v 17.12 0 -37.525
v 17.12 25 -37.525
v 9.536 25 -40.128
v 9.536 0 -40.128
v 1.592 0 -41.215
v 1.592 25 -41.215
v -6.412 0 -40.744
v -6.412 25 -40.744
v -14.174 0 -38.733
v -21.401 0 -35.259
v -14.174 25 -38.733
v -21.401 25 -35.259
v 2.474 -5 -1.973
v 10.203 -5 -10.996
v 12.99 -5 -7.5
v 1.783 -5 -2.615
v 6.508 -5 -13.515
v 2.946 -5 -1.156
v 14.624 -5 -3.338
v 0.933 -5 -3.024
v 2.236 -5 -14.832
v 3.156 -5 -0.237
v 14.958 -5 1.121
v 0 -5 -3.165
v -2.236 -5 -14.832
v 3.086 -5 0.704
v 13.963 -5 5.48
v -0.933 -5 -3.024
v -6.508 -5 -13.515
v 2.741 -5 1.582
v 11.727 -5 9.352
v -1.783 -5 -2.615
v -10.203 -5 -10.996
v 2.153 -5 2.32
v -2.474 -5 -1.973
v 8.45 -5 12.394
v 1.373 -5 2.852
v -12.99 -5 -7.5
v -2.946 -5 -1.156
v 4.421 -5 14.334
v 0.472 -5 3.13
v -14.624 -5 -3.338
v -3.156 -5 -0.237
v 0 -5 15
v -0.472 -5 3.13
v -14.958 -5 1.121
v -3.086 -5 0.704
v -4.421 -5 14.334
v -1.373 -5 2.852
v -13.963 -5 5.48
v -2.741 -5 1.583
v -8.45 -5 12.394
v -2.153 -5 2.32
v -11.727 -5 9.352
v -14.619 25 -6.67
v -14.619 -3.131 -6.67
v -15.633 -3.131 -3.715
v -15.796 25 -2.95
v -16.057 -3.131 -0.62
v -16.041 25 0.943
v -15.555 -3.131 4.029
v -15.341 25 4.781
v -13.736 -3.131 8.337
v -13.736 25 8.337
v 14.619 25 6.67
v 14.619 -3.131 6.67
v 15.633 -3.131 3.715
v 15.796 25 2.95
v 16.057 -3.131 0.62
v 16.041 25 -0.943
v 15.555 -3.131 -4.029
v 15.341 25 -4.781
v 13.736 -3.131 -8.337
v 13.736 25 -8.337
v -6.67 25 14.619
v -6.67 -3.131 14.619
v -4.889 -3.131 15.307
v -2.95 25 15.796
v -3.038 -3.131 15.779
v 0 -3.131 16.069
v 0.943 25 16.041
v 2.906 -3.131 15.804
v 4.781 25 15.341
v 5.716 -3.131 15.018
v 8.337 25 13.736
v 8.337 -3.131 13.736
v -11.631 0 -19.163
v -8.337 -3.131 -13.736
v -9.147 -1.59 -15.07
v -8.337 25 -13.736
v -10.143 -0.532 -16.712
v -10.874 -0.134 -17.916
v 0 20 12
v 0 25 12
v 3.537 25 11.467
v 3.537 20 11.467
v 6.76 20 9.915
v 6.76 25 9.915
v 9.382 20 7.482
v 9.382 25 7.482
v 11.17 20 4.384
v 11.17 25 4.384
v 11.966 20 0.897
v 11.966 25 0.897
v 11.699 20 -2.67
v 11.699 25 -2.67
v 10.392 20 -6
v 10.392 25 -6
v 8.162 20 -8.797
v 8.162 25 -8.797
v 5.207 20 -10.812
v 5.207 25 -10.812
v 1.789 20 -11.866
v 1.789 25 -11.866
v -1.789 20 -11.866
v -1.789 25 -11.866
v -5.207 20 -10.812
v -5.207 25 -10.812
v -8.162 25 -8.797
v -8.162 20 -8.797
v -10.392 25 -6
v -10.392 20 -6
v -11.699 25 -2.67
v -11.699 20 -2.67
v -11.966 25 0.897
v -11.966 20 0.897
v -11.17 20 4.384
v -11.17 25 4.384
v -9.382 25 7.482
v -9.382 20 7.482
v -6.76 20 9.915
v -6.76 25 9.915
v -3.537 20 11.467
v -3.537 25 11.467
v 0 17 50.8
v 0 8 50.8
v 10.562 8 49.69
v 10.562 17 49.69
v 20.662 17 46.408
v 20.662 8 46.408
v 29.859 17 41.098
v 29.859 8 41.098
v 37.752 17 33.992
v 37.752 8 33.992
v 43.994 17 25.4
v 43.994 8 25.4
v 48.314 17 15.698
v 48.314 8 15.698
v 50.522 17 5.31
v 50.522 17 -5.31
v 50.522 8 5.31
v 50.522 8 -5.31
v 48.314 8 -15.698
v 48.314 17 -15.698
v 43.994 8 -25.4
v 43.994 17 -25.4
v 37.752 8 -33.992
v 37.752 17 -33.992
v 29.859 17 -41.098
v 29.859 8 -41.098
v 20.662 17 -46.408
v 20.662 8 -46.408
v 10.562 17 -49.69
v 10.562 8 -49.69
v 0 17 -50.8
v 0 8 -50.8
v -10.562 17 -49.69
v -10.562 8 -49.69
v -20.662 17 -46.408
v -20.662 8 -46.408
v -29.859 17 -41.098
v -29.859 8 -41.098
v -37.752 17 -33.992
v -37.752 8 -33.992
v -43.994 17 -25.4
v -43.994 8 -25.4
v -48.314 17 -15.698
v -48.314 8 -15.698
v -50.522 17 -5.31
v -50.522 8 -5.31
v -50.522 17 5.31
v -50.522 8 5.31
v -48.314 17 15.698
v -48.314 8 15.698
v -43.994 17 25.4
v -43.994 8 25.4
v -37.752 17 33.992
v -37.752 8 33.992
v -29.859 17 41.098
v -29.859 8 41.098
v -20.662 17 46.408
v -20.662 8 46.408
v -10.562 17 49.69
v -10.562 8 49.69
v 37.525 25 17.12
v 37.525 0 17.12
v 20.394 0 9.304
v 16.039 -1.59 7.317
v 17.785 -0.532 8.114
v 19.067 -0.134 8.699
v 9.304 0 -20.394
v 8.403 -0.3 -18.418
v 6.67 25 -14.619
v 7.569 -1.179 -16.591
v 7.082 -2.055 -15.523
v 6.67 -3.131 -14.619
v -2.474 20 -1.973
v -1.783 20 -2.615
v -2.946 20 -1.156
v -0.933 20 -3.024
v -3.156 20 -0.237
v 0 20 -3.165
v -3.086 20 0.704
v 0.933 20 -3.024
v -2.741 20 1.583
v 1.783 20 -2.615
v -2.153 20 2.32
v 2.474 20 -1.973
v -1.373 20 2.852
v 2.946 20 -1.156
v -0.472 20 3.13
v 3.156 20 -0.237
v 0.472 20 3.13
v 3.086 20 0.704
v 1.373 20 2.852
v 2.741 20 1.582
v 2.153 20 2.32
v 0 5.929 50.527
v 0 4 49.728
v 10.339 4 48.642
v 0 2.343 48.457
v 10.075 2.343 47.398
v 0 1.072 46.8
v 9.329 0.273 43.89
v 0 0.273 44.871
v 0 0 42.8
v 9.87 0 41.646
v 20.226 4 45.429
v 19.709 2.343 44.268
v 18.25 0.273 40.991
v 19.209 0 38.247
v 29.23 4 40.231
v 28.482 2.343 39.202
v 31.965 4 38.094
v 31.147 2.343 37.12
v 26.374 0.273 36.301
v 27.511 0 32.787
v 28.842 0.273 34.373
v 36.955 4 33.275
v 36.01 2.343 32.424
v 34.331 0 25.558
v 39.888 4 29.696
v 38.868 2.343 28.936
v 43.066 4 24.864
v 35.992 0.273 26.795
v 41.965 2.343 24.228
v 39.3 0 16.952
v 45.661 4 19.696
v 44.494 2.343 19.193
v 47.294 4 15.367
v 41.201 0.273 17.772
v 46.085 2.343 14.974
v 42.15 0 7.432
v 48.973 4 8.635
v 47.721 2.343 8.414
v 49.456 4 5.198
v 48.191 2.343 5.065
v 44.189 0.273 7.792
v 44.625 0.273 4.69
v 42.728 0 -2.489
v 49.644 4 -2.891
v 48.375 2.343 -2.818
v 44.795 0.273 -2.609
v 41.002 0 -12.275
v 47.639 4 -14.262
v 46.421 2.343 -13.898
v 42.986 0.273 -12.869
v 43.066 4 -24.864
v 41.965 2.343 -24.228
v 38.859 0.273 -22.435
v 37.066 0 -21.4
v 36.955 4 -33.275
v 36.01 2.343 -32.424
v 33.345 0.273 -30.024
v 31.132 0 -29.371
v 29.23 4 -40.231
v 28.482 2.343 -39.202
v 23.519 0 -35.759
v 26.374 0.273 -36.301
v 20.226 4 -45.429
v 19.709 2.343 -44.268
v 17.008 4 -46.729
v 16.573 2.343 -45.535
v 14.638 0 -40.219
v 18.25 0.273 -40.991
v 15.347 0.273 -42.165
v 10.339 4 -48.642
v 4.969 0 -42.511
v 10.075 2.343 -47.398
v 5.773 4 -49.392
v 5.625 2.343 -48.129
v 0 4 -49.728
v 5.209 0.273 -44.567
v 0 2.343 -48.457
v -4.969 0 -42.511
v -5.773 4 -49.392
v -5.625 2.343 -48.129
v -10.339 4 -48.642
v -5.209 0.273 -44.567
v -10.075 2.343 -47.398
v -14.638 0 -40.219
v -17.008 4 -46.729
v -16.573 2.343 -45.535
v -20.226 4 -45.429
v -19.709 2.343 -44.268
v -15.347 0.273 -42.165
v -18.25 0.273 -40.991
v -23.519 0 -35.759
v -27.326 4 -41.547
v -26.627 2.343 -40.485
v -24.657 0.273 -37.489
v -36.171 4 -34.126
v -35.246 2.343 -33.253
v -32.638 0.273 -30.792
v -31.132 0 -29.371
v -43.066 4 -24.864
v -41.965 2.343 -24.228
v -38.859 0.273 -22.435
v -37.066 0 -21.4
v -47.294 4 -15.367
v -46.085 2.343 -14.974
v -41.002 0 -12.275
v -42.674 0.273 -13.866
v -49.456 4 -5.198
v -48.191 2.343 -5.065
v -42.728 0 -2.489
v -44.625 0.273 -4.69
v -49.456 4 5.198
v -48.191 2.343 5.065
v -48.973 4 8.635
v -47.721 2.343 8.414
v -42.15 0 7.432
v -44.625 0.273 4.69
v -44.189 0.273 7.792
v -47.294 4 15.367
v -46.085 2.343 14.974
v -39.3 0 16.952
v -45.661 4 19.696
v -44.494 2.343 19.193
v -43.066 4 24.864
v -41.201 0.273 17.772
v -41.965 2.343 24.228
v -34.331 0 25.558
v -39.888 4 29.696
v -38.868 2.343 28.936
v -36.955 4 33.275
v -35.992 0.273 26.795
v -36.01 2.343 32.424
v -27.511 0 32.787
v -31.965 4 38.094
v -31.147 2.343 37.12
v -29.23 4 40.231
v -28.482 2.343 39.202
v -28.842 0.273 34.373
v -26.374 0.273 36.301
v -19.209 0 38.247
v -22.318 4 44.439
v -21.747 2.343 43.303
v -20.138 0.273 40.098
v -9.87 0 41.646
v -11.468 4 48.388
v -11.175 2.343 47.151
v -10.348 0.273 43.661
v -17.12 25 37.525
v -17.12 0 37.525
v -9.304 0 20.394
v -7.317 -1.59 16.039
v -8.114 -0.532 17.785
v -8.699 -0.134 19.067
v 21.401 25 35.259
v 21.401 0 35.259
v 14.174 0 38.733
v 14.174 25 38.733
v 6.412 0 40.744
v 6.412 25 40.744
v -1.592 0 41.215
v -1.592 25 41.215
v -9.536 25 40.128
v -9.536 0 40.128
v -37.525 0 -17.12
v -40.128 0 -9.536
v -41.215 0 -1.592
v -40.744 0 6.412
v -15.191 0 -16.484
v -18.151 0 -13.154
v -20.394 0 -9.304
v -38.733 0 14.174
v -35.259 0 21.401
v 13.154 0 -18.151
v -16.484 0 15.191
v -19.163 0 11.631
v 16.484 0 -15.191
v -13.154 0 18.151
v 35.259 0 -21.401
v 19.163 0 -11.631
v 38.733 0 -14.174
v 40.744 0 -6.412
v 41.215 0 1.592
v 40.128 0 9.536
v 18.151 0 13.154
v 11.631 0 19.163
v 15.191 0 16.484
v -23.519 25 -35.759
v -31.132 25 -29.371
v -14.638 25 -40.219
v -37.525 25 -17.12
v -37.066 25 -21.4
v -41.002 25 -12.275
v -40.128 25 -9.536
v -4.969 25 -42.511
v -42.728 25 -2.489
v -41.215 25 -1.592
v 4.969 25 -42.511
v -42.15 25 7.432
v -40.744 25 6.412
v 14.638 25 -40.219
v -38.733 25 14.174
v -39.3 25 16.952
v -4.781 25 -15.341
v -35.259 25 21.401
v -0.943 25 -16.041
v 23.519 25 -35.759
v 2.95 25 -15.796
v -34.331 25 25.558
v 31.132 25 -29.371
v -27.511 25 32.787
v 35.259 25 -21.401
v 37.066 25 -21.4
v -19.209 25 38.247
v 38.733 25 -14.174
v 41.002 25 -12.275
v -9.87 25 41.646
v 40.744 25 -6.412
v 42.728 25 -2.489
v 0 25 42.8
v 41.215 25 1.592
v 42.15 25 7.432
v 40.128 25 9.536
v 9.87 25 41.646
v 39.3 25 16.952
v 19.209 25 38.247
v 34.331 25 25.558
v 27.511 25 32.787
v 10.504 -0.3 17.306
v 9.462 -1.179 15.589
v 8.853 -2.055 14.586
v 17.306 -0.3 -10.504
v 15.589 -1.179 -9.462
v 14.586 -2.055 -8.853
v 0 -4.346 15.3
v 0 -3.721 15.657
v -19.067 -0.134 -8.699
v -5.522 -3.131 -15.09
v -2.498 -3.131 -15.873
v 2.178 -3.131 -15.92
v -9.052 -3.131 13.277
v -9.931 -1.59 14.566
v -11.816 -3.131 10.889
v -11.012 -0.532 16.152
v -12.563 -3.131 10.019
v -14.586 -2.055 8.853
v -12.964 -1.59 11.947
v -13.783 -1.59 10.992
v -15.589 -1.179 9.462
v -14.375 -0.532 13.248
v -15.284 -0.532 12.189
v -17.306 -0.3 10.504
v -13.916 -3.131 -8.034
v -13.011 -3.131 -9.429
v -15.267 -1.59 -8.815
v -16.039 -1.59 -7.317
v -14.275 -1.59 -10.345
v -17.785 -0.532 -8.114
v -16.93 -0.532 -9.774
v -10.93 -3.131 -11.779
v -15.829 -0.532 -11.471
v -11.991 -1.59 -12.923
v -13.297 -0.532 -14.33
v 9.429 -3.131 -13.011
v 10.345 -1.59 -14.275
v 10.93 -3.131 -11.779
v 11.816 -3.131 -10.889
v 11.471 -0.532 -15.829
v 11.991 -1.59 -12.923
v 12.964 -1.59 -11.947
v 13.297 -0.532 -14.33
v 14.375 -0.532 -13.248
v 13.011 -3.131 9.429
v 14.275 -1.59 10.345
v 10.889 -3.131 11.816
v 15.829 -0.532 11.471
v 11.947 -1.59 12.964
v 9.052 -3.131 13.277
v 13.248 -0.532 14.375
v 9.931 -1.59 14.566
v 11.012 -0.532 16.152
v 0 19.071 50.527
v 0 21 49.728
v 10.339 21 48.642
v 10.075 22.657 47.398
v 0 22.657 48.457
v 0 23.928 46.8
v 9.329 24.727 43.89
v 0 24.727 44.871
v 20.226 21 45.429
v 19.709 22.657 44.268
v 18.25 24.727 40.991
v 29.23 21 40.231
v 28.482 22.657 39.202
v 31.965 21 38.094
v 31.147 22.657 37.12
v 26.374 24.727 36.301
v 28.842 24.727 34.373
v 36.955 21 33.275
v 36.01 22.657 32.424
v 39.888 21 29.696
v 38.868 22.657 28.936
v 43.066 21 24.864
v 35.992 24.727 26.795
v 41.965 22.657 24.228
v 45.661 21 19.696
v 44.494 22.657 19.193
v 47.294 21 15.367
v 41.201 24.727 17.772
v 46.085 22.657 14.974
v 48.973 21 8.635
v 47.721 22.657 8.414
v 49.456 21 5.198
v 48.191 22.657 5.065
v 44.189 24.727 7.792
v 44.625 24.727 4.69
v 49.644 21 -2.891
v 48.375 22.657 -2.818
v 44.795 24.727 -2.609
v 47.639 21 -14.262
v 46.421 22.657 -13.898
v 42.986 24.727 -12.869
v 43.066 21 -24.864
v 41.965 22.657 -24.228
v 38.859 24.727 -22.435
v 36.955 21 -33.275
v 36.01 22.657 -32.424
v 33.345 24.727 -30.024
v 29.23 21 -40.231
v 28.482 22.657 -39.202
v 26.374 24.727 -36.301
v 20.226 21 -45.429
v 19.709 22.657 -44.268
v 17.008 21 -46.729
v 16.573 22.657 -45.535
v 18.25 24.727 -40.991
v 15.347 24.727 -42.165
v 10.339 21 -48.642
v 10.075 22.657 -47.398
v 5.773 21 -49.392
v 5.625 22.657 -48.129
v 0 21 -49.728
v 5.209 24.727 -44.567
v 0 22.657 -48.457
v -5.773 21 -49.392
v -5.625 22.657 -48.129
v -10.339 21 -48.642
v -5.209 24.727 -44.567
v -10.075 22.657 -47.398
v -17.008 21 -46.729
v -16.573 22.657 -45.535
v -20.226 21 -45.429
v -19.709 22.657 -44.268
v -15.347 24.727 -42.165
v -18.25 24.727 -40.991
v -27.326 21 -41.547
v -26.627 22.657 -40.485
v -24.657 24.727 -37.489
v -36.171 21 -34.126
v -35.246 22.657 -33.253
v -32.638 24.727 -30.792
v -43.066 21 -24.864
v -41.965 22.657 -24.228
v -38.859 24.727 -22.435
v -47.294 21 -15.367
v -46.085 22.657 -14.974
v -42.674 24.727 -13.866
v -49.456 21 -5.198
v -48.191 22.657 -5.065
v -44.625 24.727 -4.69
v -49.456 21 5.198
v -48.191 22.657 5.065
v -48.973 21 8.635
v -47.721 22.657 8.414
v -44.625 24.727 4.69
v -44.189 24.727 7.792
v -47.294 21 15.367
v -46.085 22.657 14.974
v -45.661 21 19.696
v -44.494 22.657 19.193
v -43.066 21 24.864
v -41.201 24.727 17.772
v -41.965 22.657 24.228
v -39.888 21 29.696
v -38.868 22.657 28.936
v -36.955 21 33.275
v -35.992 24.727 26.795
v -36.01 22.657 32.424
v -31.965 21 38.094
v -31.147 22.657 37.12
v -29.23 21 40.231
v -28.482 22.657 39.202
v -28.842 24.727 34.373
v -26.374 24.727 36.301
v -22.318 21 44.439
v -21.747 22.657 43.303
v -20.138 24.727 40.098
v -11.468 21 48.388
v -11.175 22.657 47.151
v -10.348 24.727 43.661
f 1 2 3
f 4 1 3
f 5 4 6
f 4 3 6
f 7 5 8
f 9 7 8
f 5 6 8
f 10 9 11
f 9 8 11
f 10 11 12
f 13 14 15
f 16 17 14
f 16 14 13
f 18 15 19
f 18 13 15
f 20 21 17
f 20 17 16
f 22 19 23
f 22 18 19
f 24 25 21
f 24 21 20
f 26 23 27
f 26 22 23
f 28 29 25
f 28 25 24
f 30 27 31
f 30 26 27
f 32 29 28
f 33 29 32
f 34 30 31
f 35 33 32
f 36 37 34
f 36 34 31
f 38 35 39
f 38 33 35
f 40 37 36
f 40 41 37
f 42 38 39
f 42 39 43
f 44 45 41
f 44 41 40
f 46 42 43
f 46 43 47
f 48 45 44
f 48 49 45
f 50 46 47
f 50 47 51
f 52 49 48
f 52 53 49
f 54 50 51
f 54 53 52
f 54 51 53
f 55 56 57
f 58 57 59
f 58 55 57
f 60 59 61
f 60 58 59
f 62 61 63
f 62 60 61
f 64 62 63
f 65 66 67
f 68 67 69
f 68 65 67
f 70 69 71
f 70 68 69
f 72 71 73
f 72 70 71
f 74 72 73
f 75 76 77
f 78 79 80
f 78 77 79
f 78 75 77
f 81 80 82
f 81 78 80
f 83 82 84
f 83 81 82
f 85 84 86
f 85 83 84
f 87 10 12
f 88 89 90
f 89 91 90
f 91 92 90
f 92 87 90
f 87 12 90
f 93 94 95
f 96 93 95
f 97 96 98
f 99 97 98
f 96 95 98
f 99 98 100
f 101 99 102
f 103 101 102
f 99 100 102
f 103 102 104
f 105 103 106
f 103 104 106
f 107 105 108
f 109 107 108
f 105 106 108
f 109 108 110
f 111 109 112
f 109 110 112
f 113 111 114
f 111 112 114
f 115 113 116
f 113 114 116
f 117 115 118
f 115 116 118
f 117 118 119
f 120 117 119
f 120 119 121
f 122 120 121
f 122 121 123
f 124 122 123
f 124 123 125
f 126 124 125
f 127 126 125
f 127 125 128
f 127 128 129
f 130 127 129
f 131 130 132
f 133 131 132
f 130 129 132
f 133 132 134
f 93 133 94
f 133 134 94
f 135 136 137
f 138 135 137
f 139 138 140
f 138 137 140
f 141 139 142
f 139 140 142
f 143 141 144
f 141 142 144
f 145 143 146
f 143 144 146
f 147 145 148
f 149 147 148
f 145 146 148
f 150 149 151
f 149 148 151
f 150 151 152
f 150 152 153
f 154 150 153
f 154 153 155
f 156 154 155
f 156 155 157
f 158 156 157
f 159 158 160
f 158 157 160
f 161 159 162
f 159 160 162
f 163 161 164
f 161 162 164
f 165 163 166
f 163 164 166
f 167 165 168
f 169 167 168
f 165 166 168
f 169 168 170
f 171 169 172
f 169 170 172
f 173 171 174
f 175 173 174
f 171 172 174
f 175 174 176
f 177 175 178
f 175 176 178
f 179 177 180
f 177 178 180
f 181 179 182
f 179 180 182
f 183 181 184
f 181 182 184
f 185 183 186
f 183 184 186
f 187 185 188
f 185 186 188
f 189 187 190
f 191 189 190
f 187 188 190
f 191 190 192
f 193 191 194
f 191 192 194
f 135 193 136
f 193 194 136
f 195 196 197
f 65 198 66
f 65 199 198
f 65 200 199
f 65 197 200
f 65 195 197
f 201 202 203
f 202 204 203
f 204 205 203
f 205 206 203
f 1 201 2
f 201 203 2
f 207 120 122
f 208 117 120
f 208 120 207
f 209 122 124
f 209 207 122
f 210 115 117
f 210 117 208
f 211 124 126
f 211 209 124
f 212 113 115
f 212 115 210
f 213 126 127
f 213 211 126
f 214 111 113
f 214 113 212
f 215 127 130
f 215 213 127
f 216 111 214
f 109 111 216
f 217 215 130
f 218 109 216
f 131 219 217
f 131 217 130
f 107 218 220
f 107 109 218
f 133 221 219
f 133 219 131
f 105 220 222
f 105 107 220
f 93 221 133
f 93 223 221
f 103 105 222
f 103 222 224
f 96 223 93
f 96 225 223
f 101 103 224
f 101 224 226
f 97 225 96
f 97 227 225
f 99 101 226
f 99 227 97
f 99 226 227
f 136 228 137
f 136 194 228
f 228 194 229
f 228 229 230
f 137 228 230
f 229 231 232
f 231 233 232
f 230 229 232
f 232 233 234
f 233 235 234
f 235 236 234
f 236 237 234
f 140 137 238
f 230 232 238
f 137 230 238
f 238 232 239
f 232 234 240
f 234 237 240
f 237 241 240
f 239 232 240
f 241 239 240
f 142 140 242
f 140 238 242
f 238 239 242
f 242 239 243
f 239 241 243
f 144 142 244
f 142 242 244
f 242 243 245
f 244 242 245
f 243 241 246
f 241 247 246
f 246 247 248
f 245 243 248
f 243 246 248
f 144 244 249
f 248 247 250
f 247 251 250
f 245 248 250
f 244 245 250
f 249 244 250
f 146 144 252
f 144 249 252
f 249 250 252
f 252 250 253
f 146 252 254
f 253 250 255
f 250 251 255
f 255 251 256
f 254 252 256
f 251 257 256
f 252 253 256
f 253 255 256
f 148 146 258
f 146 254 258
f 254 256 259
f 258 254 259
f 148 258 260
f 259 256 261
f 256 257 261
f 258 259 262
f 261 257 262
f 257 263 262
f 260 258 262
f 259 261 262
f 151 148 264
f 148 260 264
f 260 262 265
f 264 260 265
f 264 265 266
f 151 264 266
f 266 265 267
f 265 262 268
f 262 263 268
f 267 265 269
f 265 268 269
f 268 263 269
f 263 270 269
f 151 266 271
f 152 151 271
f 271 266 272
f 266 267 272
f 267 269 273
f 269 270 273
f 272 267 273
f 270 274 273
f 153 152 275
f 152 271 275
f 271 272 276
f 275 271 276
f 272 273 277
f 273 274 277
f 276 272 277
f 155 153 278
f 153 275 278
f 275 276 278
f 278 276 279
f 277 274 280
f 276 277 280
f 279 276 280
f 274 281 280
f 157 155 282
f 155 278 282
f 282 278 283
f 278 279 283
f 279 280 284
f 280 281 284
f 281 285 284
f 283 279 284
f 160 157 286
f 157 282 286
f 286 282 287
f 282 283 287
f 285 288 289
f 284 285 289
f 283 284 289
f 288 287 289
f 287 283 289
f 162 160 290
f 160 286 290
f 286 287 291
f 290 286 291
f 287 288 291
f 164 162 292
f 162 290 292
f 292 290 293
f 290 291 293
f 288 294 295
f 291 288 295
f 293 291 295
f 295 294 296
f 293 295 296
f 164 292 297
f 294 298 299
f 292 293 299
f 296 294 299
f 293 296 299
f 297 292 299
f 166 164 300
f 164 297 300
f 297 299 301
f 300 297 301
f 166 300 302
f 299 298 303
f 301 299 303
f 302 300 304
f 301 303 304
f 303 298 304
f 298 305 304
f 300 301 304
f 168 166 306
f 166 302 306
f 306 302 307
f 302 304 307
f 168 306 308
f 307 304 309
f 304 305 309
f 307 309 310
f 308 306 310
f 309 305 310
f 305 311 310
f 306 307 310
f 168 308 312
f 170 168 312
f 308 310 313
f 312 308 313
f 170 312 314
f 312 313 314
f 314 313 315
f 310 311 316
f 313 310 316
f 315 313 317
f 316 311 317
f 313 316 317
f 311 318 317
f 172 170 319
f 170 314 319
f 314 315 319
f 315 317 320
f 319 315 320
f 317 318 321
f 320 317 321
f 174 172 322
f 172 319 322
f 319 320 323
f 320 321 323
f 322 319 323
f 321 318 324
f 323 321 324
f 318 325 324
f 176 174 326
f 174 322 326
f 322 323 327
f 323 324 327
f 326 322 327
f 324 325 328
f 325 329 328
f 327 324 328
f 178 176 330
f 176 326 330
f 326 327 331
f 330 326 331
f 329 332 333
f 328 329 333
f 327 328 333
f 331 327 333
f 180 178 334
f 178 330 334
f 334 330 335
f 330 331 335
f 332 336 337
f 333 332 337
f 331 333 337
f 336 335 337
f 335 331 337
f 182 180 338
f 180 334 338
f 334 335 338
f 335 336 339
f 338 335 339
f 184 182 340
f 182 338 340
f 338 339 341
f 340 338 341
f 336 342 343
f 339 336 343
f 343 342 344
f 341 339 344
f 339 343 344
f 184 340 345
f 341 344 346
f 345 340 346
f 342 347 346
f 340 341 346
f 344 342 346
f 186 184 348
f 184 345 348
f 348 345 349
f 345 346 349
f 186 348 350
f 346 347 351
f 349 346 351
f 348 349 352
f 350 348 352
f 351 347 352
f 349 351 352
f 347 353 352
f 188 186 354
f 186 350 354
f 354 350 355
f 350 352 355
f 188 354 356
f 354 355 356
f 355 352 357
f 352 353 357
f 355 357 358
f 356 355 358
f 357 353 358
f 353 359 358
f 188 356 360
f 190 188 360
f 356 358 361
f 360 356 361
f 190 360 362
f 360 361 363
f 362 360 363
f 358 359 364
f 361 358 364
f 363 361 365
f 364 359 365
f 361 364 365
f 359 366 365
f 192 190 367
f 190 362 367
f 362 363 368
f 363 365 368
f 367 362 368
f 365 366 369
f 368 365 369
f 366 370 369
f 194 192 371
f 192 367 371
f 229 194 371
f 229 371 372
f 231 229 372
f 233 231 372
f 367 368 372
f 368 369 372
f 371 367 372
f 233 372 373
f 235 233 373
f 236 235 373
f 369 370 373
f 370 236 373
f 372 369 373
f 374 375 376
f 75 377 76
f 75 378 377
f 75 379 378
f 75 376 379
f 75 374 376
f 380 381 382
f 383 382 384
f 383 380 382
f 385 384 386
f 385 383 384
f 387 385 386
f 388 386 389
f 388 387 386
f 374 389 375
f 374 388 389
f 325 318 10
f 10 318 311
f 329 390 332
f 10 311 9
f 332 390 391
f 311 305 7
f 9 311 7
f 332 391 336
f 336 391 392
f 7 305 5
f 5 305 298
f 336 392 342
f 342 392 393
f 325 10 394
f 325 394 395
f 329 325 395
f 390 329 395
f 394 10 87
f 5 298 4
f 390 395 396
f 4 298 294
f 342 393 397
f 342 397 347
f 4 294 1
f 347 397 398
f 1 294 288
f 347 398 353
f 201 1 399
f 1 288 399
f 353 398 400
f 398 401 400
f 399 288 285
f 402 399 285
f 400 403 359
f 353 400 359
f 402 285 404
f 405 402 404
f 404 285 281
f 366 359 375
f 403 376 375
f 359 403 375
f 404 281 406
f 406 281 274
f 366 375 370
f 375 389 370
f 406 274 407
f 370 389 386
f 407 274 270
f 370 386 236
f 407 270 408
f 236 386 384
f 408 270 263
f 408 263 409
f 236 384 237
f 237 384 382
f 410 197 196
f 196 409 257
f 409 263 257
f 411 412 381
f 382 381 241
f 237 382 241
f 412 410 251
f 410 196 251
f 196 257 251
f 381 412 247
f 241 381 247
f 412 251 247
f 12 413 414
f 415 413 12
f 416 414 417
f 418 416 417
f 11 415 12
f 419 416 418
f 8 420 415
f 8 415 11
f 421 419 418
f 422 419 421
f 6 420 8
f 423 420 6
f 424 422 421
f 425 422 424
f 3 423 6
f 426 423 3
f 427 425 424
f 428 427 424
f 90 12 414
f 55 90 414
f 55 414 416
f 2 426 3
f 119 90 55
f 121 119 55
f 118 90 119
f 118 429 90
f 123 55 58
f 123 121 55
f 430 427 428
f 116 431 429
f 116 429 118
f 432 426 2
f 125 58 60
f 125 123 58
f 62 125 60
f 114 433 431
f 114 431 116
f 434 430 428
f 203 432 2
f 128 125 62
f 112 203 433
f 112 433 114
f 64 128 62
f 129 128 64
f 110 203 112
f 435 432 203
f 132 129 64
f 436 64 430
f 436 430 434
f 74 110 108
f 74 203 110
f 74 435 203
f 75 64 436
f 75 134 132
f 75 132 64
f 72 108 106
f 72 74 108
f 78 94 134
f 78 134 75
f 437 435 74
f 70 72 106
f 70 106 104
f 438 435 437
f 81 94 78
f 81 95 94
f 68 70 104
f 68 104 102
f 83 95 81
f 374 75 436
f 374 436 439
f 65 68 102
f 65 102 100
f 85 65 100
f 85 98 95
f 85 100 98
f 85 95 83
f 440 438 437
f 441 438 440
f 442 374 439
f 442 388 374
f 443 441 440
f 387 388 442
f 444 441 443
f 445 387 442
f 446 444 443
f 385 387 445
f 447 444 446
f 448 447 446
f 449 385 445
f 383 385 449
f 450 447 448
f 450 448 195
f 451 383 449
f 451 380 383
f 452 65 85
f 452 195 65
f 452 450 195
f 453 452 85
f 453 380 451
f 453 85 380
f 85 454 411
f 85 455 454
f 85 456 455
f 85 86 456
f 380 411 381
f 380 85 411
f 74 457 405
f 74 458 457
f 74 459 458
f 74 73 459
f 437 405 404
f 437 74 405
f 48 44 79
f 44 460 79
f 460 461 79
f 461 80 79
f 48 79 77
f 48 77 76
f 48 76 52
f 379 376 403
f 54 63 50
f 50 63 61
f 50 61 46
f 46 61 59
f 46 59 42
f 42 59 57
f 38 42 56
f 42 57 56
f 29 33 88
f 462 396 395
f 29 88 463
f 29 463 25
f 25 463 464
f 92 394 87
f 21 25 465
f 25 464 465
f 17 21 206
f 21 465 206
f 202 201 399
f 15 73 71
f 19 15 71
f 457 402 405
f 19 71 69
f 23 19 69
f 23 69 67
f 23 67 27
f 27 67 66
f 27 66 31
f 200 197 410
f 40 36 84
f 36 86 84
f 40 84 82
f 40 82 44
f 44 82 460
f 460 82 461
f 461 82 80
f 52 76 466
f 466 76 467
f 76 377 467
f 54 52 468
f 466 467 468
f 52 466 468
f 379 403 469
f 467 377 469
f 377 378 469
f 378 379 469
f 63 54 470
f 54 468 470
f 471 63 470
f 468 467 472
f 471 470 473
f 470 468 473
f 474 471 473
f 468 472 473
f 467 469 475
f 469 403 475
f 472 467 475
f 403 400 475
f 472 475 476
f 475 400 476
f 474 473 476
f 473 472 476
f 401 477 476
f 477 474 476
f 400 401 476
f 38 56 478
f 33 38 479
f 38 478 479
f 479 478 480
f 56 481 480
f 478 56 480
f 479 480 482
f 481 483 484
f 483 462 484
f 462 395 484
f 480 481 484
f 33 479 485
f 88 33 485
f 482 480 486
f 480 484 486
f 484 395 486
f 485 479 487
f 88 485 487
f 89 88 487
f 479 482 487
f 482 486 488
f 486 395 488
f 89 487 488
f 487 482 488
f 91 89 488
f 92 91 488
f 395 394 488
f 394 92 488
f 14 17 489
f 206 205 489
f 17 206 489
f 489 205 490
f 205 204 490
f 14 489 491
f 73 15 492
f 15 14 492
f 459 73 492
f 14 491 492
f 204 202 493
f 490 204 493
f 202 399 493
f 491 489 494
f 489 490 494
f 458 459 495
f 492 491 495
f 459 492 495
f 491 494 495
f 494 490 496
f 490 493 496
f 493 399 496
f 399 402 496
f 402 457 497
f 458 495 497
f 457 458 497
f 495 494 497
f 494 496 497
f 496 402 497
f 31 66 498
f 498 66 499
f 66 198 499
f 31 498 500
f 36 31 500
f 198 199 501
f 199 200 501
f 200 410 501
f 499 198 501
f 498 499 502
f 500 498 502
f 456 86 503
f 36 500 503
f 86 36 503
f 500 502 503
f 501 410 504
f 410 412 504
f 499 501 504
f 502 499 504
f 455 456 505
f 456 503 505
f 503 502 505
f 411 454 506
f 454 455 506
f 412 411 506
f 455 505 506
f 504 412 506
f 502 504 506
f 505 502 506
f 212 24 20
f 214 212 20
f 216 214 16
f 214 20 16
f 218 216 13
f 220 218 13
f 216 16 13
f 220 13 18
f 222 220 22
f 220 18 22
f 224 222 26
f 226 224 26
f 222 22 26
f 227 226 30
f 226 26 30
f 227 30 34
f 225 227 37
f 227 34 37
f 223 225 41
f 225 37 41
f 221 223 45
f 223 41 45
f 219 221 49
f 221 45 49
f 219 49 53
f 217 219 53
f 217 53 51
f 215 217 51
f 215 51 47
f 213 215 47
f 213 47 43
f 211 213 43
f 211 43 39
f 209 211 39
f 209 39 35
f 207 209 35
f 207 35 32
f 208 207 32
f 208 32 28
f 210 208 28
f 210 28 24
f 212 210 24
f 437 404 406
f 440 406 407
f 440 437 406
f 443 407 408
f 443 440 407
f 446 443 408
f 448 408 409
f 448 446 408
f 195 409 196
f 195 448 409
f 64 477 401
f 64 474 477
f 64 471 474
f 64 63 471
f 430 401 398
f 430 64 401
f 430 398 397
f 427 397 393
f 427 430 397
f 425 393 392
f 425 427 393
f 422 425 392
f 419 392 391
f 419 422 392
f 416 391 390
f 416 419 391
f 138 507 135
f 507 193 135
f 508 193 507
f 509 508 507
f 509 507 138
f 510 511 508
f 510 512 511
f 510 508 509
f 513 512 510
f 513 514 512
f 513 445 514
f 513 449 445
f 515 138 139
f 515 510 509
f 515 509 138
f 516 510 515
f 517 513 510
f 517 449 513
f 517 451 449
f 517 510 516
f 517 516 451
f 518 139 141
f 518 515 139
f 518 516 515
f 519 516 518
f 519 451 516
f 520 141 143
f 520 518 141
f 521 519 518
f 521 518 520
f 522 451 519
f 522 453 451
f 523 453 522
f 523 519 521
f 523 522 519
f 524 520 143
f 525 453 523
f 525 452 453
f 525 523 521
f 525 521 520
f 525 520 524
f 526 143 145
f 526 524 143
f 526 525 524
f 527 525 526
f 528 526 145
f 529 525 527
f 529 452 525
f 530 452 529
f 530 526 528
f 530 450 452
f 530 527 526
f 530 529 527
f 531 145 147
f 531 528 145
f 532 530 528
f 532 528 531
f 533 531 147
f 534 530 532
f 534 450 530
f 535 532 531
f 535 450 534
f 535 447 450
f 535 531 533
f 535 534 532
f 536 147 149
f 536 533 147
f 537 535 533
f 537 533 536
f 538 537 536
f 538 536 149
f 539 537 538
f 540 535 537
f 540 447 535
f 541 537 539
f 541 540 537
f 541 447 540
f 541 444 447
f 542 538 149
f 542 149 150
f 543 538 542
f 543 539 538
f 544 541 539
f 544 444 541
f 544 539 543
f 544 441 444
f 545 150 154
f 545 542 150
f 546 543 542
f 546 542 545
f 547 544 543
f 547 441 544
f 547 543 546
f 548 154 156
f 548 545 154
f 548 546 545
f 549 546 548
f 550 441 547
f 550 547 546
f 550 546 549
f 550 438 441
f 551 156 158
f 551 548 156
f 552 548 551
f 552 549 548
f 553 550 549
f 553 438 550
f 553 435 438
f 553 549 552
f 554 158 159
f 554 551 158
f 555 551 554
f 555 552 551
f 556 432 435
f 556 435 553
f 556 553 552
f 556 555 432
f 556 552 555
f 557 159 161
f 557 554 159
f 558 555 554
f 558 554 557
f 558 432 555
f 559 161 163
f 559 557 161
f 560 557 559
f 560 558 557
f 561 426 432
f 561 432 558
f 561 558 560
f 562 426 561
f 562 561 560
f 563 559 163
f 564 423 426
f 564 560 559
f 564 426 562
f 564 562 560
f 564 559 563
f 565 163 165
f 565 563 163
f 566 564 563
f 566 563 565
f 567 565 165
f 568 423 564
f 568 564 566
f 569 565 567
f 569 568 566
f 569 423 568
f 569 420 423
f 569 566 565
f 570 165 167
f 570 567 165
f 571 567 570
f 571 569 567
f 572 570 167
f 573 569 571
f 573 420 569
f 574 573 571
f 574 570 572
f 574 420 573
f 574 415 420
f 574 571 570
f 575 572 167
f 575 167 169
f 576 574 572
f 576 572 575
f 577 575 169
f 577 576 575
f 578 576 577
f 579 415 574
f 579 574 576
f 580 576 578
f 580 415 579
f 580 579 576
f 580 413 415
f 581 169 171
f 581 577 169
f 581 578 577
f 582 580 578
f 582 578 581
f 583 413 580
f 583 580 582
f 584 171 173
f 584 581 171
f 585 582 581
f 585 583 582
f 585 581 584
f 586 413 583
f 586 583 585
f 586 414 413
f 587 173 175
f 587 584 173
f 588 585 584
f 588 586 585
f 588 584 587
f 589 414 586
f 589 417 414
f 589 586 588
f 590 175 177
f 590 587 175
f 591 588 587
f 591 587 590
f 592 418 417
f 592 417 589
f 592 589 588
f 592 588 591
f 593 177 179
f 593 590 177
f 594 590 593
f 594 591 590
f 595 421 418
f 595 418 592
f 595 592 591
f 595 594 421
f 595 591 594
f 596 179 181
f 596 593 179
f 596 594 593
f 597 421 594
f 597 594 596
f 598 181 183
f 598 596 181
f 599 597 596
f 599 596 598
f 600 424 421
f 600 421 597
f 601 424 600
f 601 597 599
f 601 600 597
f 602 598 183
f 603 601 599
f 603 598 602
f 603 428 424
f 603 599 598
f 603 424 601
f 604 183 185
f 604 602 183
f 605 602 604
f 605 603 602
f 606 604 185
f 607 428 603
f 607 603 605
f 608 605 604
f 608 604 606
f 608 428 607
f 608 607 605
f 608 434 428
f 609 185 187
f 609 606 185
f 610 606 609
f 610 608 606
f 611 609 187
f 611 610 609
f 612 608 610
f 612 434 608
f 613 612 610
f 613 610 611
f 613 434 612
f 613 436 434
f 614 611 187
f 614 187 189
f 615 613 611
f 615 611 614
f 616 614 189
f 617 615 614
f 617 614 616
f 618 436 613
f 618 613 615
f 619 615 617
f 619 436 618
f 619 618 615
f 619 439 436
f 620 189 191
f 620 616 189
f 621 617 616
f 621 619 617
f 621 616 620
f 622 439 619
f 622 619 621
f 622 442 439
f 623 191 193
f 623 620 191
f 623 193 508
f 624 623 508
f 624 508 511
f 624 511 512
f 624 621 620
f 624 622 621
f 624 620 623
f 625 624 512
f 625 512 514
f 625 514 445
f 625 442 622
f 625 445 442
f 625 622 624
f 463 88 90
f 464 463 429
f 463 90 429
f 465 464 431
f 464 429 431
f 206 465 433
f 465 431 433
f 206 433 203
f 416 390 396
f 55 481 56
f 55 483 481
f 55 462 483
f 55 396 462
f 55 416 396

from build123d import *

# Parameters (mm, degrees)
SKETCH1_R           = 50.8
BOSS_EXTRUDE1_DEPTH = 25
FILLET2_R           = 8
FILLET3_R           = 8
SKETCH2_R           = 15
BOSS_EXTRUDE2_DEPTH = 5
SKETCH3_R           = 12
CUT_EXTRUDE1_DEPTH  = 5
FILLET4_R           = 8
SKETCH5_R           = 3.165
CUT_EXTRUDE2_DEPTH  = 78.85422275
CUT_EXTRUDE3_DEPTH  = 78.85422275


with BuildPart() as part:
    # Sketch1 → Boss-Extrude1 (new body)
    with BuildSketch(Plane(origin=(0, 0, 0), x_dir=(1, 0, 0), z_dir=(0, 1, 0))):
        with Locations(Location((0, 0, 0), (0, 0, 270))):
            Circle(SKETCH1_R)
    extrude(amount=BOSS_EXTRUDE1_DEPTH)

    # Fillet2
    fillet2_edges = [part.edges().sort_by_distance(p)[0] for p in [
        (0, 25, -50.8),
    ]]
    fillet(fillet2_edges, radius=FILLET2_R)

    # Fillet3
    fillet3_edges = [part.edges().sort_by_distance(p)[0] for p in [
        (0, 0, -50.8),
    ]]
    fillet(fillet3_edges, radius=FILLET3_R)

    # Sketch2 → Boss-Extrude2 (add)
    with BuildSketch(Plane.XZ):
        with Locations(Location((0, 0, 0), (0, 0, 90))):
            Circle(SKETCH2_R)
    extrude(amount=BOSS_EXTRUDE2_DEPTH)

    # Sketch3 → Cut-Extrude1 (cut)
    with BuildSketch(Plane(origin=(0, 25, 0), x_dir=(1, 0, 0), z_dir=(0, 1, 0))):
        with Locations(Location((0, 0, 0), (0, 0, 270))):
            Circle(SKETCH3_R)
    extrude(amount=-CUT_EXTRUDE1_DEPTH, mode=Mode.SUBTRACT)

    # Fillet4
    # the kernel refuses this fillet: 8 mm, written as the material it adds along each edge
    with BuildSketch(Plane(origin=(0, 0, 0), x_dir=(0, 0, 1), z_dir=(1, 0, 0))) as fillet4_piece_1:
        with BuildLine():
            CenterArc((22.416198487, 8), FILLET4_R, 202.024312837, 67.975687163)
            Line((15, 5), (14.85167603, 4.94))
            ThreePointArc((14.85167603, 4.94), (14.84, 2.5), (14.84, 0))
            Line((14.84, 0), (15, -0.16))
            Line((15, -0.16), (22.416198487, -0.16))
            Line((22.416198487, -0.16), (22.416198487, 0))
        make_face()
    revolve(axis=Axis((0, 0, 0), (0, -1, 0)))

    # Sketch5 → Cut-Extrude2 (cut, through all)
    with BuildSketch(Plane.XZ.offset(5)):
        with Locations(Location((0, 0, 0), (0, 0, 270))):
            Circle(SKETCH5_R)
    extrude(amount=-CUT_EXTRUDE2_DEPTH, mode=Mode.SUBTRACT)

    # Sketch6 → Cut-Extrude3 (cut, through all)
    with BuildSketch(Plane(origin=(0, 25, 0), x_dir=(1, 0, 0), z_dir=(0, 1, 0))):
        with BuildLine():
            Line((6.669640143, 14.619160774), (17.119775233, 37.524775128))
            ThreePointArc((17.119775233, 37.524775128), (-2.42176691, 41.174391282), (-21.4007271, 35.259102825))
            Line((-21.4007271, 35.259102825), (-8.337442905, 13.736484528))
            ThreePointArc((-8.337442905, 13.736484528), (-0.943488661, 16.041003414), (6.669640143, 14.619160774))
        make_face()
        with BuildLine():
            Line((13.736484528, 8.337442905), (35.259102825, 21.4007271))
            ThreePointArc((35.259102825, 21.4007271), (41.174391282, 2.42176691), (37.524775128, -17.119775233))
            Line((37.524775128, -17.119775233), (14.619160774, -6.669640143))
            ThreePointArc((14.619160774, -6.669640143), (16.041003414, 0.943488661), (13.736484528, 8.337442905))
        make_face()
        with BuildLine():
            Line((8.337442905, -13.736484528), (21.4007271, -35.259102825))
            ThreePointArc((21.4007271, -35.259102825), (2.42176691, -41.174391282), (-17.119775233, -37.524775128))
            Line((-17.119775233, -37.524775128), (-6.669640143, -14.619160774))
            ThreePointArc((-6.669640143, -14.619160774), (0.943488661, -16.041003414), (8.337442905, -13.736484528))
        make_face()
        with BuildLine():
            Line((-13.736484528, -8.337442905), (-35.259102825, -21.4007271))
            ThreePointArc((-35.259102825, -21.4007271), (-41.174391282, -2.42176691), (-37.524775128, 17.119775233))
            Line((-37.524775128, 17.119775233), (-14.619160774, 6.669640143))
            ThreePointArc((-14.619160774, 6.669640143), (-16.041003414, -0.943488661), (-13.736484528, -8.337442905))
        make_face()
    extrude(amount=-CUT_EXTRUDE3_DEPTH, mode=Mode.SUBTRACT)


solid = part.part
